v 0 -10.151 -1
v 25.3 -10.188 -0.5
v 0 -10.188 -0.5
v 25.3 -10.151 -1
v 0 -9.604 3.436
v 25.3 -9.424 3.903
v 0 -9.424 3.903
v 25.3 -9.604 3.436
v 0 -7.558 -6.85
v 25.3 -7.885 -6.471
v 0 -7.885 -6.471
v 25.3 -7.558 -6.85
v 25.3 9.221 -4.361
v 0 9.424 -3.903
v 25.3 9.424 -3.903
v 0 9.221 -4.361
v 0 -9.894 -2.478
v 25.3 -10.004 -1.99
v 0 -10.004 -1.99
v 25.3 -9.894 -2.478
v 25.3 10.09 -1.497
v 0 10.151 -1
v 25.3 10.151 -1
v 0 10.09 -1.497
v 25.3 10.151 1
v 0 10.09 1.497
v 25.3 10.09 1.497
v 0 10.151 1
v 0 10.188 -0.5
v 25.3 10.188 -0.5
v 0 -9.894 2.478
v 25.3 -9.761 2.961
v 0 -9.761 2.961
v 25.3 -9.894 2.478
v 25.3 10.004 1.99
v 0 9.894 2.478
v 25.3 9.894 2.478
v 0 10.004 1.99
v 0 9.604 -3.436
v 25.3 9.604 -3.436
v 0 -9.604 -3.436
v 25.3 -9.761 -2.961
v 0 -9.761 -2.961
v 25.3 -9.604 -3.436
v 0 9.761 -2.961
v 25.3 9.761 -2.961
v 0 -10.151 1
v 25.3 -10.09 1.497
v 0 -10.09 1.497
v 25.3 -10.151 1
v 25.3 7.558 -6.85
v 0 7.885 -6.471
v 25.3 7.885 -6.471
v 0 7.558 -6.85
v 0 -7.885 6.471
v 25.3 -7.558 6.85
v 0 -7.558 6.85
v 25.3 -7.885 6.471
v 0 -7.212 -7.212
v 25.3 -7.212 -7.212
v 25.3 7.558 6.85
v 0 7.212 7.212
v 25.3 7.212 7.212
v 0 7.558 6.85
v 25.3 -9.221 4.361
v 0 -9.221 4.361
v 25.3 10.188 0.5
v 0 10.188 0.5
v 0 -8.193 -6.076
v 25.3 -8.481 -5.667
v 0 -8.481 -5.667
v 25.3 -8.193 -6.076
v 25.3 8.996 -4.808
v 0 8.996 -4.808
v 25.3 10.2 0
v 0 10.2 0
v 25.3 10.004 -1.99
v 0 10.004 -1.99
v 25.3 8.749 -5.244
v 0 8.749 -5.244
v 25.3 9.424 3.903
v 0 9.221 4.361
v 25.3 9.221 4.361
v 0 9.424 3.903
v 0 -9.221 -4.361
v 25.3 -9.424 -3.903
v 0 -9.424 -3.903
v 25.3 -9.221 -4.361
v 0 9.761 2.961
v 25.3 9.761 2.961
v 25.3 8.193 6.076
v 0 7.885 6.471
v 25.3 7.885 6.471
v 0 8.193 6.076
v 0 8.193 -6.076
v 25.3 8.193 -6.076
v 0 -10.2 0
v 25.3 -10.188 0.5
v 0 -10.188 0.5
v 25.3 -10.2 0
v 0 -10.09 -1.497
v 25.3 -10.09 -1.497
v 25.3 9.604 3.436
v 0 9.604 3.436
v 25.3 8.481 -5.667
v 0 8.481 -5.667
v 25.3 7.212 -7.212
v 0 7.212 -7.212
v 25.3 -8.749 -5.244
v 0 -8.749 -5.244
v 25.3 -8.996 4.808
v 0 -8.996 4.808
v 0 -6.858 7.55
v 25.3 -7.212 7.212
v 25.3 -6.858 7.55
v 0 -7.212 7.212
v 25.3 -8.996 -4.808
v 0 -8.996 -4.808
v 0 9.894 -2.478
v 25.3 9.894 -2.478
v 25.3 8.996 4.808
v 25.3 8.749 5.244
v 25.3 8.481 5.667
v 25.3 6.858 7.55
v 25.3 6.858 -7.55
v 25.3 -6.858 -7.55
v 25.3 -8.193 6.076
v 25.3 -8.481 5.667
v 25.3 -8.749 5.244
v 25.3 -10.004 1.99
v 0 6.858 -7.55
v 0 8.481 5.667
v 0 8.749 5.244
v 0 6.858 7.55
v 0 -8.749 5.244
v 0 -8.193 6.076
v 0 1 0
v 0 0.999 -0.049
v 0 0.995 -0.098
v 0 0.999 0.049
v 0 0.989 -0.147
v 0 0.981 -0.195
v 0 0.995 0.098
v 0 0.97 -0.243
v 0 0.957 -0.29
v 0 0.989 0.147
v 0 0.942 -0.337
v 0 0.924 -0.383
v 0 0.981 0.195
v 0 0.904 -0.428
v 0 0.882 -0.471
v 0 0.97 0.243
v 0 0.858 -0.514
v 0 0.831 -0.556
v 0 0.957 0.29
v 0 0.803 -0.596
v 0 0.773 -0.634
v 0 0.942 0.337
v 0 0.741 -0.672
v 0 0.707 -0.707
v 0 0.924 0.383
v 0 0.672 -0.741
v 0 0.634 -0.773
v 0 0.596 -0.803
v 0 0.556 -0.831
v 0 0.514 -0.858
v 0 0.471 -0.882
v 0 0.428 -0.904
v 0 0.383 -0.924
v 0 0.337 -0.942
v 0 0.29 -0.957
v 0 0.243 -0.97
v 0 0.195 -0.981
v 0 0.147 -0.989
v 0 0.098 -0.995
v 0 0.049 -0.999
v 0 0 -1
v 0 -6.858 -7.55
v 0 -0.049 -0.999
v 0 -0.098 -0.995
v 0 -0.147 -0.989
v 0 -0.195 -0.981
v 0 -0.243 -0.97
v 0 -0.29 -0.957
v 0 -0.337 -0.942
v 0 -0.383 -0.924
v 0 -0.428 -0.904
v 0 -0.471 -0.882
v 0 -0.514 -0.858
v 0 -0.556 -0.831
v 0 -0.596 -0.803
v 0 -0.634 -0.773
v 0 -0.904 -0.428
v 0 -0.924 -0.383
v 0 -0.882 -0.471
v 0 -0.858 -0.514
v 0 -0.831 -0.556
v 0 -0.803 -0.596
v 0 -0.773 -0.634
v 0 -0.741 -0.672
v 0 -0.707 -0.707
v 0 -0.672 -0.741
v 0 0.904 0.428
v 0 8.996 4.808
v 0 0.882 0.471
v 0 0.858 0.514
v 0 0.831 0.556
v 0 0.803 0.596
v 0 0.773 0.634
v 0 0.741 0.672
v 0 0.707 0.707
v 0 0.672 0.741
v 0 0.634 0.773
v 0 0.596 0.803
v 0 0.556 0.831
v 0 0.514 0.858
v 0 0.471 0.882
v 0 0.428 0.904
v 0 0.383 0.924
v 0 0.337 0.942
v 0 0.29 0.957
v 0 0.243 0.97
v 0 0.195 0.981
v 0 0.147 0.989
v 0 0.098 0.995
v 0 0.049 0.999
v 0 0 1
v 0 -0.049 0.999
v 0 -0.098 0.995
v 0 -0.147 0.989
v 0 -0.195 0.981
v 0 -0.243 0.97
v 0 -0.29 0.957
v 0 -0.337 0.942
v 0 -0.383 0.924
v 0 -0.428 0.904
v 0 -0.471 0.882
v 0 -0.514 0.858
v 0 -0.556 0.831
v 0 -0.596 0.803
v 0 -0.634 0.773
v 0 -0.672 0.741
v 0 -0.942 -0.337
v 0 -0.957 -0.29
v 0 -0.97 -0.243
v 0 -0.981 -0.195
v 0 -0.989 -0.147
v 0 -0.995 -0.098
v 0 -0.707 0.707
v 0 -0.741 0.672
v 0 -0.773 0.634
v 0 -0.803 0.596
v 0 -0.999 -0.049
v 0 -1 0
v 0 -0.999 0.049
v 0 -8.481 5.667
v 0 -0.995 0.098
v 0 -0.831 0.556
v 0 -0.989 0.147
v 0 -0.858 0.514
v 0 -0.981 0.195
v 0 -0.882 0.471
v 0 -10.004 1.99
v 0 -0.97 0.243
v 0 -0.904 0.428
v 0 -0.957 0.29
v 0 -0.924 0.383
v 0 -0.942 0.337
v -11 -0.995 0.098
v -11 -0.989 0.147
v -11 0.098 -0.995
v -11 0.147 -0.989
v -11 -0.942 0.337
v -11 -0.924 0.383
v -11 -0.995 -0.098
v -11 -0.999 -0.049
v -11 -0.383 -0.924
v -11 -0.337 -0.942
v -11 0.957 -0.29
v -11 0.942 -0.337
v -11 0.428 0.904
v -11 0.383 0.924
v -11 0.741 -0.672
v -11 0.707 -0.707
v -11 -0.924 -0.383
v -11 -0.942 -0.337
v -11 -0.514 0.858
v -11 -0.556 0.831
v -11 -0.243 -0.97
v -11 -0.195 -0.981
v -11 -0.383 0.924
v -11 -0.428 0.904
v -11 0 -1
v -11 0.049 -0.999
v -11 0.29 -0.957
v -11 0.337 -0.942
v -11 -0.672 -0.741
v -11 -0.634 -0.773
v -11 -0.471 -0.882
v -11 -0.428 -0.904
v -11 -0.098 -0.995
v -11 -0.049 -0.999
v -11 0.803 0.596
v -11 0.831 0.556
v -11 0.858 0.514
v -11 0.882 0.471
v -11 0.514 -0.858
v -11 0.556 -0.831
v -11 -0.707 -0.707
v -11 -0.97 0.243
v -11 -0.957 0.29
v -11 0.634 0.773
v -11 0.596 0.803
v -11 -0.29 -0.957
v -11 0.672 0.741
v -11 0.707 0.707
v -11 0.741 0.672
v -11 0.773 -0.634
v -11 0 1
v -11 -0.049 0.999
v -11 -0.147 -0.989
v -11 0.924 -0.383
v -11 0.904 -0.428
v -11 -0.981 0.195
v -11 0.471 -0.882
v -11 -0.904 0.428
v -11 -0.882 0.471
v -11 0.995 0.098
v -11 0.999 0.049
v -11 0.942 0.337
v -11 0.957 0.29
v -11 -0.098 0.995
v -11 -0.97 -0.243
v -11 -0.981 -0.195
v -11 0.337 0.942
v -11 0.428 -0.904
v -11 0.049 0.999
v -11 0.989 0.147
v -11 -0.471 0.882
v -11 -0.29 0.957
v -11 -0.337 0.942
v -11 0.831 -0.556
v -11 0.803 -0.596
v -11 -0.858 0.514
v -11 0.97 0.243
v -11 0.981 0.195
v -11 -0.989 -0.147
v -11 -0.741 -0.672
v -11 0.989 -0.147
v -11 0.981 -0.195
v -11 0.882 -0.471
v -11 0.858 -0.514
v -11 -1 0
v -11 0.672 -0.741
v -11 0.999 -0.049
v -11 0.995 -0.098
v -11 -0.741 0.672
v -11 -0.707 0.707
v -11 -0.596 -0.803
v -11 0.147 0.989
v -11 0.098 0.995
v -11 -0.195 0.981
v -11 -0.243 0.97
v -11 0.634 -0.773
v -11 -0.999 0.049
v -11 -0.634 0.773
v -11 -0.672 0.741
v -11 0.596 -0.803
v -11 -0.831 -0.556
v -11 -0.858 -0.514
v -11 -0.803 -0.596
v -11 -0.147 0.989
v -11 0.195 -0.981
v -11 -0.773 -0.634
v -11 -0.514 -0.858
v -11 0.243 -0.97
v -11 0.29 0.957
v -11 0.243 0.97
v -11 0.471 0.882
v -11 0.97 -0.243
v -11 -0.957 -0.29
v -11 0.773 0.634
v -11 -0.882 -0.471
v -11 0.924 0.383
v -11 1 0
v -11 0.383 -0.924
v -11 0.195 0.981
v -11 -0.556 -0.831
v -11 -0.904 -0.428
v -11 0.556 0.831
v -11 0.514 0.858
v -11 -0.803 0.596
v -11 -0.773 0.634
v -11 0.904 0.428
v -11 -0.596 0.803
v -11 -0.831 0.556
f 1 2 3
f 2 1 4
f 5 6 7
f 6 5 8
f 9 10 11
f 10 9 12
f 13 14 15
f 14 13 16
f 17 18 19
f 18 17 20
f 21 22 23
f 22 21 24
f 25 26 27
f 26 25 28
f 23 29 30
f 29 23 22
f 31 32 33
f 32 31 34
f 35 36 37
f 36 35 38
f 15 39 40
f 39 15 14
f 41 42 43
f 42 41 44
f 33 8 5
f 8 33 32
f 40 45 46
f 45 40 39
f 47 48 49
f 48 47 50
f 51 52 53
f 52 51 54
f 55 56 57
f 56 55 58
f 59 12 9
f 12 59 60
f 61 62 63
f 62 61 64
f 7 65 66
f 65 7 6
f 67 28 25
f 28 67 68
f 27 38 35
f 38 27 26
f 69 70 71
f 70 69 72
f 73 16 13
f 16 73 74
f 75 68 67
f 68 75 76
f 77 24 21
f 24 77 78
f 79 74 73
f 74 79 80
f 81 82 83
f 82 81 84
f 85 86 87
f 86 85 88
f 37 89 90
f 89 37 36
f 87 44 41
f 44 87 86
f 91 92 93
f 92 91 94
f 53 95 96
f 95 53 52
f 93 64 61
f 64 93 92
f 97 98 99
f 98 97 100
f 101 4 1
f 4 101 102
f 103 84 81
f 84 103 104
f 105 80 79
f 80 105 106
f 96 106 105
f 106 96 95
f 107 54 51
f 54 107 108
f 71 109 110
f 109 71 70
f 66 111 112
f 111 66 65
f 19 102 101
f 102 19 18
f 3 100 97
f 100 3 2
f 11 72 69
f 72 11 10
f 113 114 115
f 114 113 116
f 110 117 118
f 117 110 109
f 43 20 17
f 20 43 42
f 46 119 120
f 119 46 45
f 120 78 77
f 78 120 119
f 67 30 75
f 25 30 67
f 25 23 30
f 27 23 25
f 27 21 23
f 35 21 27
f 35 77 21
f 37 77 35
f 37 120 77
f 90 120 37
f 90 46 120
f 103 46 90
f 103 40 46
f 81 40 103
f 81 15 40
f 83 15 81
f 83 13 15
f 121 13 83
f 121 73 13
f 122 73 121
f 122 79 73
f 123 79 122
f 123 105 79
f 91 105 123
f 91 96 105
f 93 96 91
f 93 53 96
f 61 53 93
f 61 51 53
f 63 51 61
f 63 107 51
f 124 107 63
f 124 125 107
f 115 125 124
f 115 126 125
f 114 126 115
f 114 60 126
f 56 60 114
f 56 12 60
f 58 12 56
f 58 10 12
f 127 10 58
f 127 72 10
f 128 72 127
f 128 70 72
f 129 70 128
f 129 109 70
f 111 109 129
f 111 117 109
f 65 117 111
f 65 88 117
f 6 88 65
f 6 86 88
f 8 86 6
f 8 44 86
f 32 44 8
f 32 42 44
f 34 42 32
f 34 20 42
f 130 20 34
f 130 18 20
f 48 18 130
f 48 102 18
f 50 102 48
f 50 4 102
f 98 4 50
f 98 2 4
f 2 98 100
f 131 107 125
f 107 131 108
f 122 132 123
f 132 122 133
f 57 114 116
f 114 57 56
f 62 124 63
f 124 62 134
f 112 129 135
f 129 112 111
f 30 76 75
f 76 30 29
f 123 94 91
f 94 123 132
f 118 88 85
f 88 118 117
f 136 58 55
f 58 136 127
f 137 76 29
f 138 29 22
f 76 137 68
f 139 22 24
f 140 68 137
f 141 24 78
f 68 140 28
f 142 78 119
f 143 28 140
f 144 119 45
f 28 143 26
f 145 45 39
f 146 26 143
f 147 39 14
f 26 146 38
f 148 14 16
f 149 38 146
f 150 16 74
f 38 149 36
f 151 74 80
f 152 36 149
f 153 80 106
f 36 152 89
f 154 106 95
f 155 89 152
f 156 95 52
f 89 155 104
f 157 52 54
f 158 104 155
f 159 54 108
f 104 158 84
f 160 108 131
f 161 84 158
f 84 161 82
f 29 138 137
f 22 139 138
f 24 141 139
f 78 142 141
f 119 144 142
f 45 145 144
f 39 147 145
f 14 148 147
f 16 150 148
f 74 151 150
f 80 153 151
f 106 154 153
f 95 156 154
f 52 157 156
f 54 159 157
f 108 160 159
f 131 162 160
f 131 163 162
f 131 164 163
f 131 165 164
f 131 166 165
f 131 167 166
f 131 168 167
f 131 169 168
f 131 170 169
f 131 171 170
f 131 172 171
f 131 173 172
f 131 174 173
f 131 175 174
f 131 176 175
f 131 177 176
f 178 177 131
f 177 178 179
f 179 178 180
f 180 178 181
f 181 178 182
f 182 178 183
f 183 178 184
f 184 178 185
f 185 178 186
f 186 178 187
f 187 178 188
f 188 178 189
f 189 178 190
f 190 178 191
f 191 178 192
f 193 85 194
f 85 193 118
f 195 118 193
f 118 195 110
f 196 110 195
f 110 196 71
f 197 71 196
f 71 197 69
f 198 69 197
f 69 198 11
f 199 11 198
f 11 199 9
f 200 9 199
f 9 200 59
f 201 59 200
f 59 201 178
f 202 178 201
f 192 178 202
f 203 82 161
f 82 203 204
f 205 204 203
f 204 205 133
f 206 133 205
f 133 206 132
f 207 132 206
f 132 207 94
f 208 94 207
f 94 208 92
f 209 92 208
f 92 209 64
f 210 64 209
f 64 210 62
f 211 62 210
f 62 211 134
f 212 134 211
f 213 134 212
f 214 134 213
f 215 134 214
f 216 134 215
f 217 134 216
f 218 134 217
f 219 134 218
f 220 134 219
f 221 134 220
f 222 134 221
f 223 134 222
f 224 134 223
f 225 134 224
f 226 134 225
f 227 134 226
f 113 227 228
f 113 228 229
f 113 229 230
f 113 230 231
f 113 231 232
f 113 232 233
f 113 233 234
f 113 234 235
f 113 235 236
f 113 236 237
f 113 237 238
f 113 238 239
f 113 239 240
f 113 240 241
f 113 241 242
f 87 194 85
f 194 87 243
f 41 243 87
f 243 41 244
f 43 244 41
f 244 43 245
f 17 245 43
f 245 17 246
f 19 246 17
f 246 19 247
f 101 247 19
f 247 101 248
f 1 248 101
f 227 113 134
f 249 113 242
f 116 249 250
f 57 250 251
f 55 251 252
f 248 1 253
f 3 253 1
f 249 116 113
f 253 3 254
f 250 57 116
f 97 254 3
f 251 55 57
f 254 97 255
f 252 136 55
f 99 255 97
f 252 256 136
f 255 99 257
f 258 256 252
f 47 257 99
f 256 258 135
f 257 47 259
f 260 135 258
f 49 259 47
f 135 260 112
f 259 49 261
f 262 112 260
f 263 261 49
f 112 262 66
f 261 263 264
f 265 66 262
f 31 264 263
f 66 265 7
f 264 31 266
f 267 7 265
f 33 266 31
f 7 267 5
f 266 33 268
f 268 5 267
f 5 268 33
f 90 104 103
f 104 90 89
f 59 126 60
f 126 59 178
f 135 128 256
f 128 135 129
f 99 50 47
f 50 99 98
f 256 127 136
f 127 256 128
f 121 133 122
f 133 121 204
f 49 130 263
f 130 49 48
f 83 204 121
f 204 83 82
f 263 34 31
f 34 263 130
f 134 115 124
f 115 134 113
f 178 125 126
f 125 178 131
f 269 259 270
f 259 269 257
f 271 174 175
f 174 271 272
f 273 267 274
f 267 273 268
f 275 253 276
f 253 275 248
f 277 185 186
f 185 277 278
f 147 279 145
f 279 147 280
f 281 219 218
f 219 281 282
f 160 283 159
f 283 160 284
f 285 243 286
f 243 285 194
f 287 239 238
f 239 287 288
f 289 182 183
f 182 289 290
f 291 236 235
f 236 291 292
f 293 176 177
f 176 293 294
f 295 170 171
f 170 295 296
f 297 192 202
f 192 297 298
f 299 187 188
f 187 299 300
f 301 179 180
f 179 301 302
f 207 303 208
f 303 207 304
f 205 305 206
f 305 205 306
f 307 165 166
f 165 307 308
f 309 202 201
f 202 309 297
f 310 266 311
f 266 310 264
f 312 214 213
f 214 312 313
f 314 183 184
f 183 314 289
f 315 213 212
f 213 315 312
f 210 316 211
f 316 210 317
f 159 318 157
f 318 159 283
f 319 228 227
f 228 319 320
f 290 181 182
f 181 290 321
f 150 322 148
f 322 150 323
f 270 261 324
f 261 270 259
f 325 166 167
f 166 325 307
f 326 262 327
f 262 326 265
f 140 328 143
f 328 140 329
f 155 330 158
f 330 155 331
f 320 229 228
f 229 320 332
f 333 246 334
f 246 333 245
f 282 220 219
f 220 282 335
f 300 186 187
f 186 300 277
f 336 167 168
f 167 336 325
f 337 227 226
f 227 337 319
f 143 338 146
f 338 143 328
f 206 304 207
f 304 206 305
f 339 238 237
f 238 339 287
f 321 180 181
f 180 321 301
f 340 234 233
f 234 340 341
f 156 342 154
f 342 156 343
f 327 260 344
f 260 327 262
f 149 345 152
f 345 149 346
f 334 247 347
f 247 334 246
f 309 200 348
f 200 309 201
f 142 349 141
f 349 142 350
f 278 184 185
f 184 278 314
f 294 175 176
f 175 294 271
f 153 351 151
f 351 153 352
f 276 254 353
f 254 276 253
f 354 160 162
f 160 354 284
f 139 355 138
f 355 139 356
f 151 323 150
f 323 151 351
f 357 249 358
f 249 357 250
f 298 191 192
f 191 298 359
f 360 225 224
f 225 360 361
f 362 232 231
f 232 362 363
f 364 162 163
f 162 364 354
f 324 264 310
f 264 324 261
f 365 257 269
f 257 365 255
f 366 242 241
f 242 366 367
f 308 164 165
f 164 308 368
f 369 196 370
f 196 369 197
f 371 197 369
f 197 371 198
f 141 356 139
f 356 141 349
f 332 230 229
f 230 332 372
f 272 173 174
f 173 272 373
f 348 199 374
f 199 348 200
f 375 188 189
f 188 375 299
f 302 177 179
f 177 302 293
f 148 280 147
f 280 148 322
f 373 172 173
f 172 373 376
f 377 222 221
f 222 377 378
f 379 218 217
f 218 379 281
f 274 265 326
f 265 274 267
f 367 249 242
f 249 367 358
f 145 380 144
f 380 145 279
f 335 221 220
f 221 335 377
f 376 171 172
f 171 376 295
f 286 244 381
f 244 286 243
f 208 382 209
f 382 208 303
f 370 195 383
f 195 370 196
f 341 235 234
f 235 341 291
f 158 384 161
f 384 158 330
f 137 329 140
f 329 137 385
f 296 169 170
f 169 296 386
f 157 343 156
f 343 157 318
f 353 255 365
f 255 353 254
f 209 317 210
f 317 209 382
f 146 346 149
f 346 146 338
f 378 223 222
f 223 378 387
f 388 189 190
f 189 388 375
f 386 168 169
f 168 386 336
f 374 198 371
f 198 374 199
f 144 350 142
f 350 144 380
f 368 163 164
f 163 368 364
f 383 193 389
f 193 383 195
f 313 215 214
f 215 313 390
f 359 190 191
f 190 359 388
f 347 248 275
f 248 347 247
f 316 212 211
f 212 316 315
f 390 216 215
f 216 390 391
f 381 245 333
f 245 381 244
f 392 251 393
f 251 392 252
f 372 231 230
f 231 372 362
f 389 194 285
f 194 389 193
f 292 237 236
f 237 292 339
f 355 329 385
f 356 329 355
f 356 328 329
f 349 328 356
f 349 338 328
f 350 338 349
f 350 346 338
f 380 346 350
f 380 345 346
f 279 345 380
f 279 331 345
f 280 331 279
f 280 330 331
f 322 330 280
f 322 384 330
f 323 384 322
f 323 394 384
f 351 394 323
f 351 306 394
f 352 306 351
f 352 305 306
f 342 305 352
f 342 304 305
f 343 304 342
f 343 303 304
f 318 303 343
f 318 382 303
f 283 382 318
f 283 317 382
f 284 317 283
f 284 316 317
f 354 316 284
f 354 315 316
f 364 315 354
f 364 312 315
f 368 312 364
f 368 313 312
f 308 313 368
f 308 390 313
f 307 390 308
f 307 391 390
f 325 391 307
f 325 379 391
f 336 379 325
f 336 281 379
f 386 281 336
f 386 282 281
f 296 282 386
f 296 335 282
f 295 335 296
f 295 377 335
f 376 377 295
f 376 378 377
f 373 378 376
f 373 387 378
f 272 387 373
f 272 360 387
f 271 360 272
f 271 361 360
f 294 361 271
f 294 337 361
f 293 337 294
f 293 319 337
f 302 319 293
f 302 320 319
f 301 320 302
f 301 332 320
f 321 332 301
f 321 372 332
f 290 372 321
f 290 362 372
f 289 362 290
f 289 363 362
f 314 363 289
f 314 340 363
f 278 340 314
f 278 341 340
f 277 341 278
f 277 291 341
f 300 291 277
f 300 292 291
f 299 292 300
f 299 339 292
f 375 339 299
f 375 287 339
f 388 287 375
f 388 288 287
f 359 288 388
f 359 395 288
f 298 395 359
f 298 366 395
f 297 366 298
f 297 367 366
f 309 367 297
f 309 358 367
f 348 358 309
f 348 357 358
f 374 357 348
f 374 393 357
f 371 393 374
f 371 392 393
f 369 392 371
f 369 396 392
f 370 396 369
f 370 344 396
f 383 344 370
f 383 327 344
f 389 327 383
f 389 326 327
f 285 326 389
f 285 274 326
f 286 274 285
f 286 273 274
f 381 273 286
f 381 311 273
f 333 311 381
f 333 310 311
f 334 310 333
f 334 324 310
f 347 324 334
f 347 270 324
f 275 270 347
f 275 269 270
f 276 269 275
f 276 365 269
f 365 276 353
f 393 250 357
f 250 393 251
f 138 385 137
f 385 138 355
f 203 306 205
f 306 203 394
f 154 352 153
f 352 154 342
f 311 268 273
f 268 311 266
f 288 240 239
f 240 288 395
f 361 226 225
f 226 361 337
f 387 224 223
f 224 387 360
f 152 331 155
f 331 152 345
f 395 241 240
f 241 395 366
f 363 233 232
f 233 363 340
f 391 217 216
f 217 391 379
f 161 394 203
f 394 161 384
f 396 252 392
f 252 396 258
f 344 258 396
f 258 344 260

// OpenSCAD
// Models derived from the specifically documented candidates, millimetres.
// Details without a dimensioned source are deliberately omitted.
part="motor";
$fn=128;
module motor_case(length=25.3,diameter=20.4,flat_height=15.1) {
    intersection() {
        rotate([0,90,0]) cylinder(h=length,d=diameter);
        translate([0,-diameter/2,-flat_height/2]) cube([length,diameter,flat_height]);
    }
}
module motor() {
    // Front case face X=0; shaft points in -X, 11 mm from that face.
    // Front boss, rear cap details and electrical terminals not modelled.
    union() {
        motor_case();
        translate([-11,0,0]) rotate([0,90,0]) cylinder(h=11.1,d=2);
    }
}
if(part=="motor") motor();
else if(part=="motor_upper_case") motor_case(25.6,20.7,15.4);
else if(part=="servo_case") cube([23,29,12.2]); // Body envelope only; lying flat.
else if(part=="buck") cube([33,16,5.7]); // Published low module outline; no -M terminals.
else if(part=="bearing") difference() { cylinder(h=5,d=16); translate([0,0,-.1]) cylinder(h=5.2,d=5); }
else assert(false,"Unknown candidate");
